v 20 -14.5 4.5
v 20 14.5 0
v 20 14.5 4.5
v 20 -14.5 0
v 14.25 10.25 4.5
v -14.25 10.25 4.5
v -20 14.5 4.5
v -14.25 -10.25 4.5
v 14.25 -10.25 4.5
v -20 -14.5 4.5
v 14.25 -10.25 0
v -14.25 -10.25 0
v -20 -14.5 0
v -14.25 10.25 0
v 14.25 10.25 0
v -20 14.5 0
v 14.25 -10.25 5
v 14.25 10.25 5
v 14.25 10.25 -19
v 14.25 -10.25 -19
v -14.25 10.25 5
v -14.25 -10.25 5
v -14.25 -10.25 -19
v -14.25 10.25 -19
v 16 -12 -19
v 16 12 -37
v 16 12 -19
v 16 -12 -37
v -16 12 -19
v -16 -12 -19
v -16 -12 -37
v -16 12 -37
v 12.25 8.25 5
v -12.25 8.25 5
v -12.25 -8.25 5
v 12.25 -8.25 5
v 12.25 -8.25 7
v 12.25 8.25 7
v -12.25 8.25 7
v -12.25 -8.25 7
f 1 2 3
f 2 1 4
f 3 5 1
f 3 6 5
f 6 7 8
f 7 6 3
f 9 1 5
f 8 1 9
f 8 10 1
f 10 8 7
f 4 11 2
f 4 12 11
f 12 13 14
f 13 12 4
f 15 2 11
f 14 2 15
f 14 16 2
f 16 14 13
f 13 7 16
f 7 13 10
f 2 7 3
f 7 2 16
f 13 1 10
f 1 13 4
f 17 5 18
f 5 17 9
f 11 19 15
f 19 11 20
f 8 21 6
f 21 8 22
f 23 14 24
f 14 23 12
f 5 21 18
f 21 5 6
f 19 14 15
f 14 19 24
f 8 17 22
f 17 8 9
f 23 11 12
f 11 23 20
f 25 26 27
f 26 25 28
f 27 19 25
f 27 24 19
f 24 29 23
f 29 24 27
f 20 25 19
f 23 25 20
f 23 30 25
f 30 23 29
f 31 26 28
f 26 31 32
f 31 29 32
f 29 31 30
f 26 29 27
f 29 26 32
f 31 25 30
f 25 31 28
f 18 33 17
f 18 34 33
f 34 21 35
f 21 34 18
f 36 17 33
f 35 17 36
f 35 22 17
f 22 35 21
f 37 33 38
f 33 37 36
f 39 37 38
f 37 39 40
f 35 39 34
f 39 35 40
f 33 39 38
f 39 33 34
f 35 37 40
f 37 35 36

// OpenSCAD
// Parameters
overall_width = 40; //[20:80:1]
overall_height = 29; //[15:58:1]
flange_thickness = 2.5; //[1.2:5:0.1]
bezel_thickness = 2; //[1:4:0.1]
corner_radius = 2.5; //[1:5:0.1]
body_width = 28.5; //[14.25:57:0.1]
body_height = 20.5; //[10.25:41:0.1]
body_depth = 22; //[11:44:0.5]
filter_can_width = 32; //[16:64:0.5]
filter_can_height = 24; //[12:48:0.5]
filter_can_depth = 18; //[9:36:0.5]
panel_cutout_width = 27.5; //[13.75:55:0.1]
panel_cutout_height = 19.5; //[9.75:39:0.1]
panel_cutout_depth = 6; //[3:12:0.5]
cutout_clearance = 0.5; //[0.2:1.5:0.1]
mount_hole_count = 2; //[2:2:1]
mount_hole_diameter = 3.2; //[2.4:6.4:0.1]
hole_clearance = 0.2; //[0.1:0.6:0.05]
mount_hole_pitch = 32; //[16:64:0.5]
screw_head_diameter = 6.5; //[4:13:0.1]
screw_head_height = 2.5; //[1:6:0.1]
insertion_orifice_width = 24.5; //[12.25:49:0.1]
insertion_orifice_height = 16.5; //[8.25:33:0.1]
insertion_orifice_depth = 8; //[4:16:0.5]
terminal_spade_zone_width = 26; //[13:52:0.5]
terminal_spade_zone_height = 18; //[9:36:0.5]
terminal_spade_zone_depth = 12; //[6:24:0.5]
overlap = 1; //[0.5:2:0.1]
include_cutout = 1; //[0:1:1]
include_keepout_volumes = 1; //[0:1:1]

// IEC Module - Detailed Geometry
module iec() {
  color("Black") {
    // Front Flange Bezel
    translate([0, 0, (flange_thickness + bezel_thickness) / 2])
      cube([overall_width, overall_height, flange_thickness + bezel_thickness], center=true);
    
    // Main Connector Body
    translate([0, 0, -(body_depth / 2) + bezel_thickness - overlap])
      cube([body_width, body_height, body_depth], center=true);
  }
}

// Mod Module - Detailed Geometry
module mod() {
  color("DimGray") {
    // Rear Filter Can Volume
    translate([0, 0, -body_depth - filter_can_depth / 2 + bezel_thickness + overlap])
      cube([filter_can_width, filter_can_height, filter_can_depth], center=true);
    
    // Terminal Spade Clearance Zone
    translate([0, 0, -body_depth - terminal_spade_zone_depth / 2 + bezel_thickness + overlap])
      cube([terminal_spade_zone_width, terminal_spade_zone_height, terminal_spade_zone_depth], center=true);
  }
}

// Assembly
module assembly() {
  union() {
    iec();
    mod();
    
    // Panel Cutout Profile
    if (include_cutout) {
      translate([0, 0, panel_cutout_depth / 2 - overlap])
        cube([panel_cutout_width + 2 * cutout_clearance, panel_cutout_height + 2 * cutout_clearance, panel_cutout_depth], center=true);
    }
    
    // Insertion Orifice Profile
    translate([0, 0, insertion_orifice_depth / 2 - overlap])
      cube([insertion_orifice_width, insertion_orifice_height, insertion_orifice_depth], center=true);
  }
  
  // Mounting Screw Holes and Screw Head Clearance
  difference() {
    // Main Solids
    union() {
      iec();
      mod();
    }
    
    // Mounting Screw Holes
    for (i = [-1, 1]) {
      translate([i * mount_hole_pitch / 2, 0, (flange_thickness + bezel_thickness) / 2])
        rotate([90, 0, 0])
        cylinder(r=(mount_hole_diameter + hole_clearance) / 2, h=flange_thickness + bezel_thickness + panel_cutout_depth + 2 * overlap, center=true);
      
      // Screw Head Clearance
      translate([i * mount_hole_pitch / 2, 0, flange_thickness + screw_head_height / 2 - overlap])
        rotate([90, 0, 0])
        cylinder(r=screw_head_diameter / 2, h=screw_head_height, center=true);
    }
  }
}

assembly();
